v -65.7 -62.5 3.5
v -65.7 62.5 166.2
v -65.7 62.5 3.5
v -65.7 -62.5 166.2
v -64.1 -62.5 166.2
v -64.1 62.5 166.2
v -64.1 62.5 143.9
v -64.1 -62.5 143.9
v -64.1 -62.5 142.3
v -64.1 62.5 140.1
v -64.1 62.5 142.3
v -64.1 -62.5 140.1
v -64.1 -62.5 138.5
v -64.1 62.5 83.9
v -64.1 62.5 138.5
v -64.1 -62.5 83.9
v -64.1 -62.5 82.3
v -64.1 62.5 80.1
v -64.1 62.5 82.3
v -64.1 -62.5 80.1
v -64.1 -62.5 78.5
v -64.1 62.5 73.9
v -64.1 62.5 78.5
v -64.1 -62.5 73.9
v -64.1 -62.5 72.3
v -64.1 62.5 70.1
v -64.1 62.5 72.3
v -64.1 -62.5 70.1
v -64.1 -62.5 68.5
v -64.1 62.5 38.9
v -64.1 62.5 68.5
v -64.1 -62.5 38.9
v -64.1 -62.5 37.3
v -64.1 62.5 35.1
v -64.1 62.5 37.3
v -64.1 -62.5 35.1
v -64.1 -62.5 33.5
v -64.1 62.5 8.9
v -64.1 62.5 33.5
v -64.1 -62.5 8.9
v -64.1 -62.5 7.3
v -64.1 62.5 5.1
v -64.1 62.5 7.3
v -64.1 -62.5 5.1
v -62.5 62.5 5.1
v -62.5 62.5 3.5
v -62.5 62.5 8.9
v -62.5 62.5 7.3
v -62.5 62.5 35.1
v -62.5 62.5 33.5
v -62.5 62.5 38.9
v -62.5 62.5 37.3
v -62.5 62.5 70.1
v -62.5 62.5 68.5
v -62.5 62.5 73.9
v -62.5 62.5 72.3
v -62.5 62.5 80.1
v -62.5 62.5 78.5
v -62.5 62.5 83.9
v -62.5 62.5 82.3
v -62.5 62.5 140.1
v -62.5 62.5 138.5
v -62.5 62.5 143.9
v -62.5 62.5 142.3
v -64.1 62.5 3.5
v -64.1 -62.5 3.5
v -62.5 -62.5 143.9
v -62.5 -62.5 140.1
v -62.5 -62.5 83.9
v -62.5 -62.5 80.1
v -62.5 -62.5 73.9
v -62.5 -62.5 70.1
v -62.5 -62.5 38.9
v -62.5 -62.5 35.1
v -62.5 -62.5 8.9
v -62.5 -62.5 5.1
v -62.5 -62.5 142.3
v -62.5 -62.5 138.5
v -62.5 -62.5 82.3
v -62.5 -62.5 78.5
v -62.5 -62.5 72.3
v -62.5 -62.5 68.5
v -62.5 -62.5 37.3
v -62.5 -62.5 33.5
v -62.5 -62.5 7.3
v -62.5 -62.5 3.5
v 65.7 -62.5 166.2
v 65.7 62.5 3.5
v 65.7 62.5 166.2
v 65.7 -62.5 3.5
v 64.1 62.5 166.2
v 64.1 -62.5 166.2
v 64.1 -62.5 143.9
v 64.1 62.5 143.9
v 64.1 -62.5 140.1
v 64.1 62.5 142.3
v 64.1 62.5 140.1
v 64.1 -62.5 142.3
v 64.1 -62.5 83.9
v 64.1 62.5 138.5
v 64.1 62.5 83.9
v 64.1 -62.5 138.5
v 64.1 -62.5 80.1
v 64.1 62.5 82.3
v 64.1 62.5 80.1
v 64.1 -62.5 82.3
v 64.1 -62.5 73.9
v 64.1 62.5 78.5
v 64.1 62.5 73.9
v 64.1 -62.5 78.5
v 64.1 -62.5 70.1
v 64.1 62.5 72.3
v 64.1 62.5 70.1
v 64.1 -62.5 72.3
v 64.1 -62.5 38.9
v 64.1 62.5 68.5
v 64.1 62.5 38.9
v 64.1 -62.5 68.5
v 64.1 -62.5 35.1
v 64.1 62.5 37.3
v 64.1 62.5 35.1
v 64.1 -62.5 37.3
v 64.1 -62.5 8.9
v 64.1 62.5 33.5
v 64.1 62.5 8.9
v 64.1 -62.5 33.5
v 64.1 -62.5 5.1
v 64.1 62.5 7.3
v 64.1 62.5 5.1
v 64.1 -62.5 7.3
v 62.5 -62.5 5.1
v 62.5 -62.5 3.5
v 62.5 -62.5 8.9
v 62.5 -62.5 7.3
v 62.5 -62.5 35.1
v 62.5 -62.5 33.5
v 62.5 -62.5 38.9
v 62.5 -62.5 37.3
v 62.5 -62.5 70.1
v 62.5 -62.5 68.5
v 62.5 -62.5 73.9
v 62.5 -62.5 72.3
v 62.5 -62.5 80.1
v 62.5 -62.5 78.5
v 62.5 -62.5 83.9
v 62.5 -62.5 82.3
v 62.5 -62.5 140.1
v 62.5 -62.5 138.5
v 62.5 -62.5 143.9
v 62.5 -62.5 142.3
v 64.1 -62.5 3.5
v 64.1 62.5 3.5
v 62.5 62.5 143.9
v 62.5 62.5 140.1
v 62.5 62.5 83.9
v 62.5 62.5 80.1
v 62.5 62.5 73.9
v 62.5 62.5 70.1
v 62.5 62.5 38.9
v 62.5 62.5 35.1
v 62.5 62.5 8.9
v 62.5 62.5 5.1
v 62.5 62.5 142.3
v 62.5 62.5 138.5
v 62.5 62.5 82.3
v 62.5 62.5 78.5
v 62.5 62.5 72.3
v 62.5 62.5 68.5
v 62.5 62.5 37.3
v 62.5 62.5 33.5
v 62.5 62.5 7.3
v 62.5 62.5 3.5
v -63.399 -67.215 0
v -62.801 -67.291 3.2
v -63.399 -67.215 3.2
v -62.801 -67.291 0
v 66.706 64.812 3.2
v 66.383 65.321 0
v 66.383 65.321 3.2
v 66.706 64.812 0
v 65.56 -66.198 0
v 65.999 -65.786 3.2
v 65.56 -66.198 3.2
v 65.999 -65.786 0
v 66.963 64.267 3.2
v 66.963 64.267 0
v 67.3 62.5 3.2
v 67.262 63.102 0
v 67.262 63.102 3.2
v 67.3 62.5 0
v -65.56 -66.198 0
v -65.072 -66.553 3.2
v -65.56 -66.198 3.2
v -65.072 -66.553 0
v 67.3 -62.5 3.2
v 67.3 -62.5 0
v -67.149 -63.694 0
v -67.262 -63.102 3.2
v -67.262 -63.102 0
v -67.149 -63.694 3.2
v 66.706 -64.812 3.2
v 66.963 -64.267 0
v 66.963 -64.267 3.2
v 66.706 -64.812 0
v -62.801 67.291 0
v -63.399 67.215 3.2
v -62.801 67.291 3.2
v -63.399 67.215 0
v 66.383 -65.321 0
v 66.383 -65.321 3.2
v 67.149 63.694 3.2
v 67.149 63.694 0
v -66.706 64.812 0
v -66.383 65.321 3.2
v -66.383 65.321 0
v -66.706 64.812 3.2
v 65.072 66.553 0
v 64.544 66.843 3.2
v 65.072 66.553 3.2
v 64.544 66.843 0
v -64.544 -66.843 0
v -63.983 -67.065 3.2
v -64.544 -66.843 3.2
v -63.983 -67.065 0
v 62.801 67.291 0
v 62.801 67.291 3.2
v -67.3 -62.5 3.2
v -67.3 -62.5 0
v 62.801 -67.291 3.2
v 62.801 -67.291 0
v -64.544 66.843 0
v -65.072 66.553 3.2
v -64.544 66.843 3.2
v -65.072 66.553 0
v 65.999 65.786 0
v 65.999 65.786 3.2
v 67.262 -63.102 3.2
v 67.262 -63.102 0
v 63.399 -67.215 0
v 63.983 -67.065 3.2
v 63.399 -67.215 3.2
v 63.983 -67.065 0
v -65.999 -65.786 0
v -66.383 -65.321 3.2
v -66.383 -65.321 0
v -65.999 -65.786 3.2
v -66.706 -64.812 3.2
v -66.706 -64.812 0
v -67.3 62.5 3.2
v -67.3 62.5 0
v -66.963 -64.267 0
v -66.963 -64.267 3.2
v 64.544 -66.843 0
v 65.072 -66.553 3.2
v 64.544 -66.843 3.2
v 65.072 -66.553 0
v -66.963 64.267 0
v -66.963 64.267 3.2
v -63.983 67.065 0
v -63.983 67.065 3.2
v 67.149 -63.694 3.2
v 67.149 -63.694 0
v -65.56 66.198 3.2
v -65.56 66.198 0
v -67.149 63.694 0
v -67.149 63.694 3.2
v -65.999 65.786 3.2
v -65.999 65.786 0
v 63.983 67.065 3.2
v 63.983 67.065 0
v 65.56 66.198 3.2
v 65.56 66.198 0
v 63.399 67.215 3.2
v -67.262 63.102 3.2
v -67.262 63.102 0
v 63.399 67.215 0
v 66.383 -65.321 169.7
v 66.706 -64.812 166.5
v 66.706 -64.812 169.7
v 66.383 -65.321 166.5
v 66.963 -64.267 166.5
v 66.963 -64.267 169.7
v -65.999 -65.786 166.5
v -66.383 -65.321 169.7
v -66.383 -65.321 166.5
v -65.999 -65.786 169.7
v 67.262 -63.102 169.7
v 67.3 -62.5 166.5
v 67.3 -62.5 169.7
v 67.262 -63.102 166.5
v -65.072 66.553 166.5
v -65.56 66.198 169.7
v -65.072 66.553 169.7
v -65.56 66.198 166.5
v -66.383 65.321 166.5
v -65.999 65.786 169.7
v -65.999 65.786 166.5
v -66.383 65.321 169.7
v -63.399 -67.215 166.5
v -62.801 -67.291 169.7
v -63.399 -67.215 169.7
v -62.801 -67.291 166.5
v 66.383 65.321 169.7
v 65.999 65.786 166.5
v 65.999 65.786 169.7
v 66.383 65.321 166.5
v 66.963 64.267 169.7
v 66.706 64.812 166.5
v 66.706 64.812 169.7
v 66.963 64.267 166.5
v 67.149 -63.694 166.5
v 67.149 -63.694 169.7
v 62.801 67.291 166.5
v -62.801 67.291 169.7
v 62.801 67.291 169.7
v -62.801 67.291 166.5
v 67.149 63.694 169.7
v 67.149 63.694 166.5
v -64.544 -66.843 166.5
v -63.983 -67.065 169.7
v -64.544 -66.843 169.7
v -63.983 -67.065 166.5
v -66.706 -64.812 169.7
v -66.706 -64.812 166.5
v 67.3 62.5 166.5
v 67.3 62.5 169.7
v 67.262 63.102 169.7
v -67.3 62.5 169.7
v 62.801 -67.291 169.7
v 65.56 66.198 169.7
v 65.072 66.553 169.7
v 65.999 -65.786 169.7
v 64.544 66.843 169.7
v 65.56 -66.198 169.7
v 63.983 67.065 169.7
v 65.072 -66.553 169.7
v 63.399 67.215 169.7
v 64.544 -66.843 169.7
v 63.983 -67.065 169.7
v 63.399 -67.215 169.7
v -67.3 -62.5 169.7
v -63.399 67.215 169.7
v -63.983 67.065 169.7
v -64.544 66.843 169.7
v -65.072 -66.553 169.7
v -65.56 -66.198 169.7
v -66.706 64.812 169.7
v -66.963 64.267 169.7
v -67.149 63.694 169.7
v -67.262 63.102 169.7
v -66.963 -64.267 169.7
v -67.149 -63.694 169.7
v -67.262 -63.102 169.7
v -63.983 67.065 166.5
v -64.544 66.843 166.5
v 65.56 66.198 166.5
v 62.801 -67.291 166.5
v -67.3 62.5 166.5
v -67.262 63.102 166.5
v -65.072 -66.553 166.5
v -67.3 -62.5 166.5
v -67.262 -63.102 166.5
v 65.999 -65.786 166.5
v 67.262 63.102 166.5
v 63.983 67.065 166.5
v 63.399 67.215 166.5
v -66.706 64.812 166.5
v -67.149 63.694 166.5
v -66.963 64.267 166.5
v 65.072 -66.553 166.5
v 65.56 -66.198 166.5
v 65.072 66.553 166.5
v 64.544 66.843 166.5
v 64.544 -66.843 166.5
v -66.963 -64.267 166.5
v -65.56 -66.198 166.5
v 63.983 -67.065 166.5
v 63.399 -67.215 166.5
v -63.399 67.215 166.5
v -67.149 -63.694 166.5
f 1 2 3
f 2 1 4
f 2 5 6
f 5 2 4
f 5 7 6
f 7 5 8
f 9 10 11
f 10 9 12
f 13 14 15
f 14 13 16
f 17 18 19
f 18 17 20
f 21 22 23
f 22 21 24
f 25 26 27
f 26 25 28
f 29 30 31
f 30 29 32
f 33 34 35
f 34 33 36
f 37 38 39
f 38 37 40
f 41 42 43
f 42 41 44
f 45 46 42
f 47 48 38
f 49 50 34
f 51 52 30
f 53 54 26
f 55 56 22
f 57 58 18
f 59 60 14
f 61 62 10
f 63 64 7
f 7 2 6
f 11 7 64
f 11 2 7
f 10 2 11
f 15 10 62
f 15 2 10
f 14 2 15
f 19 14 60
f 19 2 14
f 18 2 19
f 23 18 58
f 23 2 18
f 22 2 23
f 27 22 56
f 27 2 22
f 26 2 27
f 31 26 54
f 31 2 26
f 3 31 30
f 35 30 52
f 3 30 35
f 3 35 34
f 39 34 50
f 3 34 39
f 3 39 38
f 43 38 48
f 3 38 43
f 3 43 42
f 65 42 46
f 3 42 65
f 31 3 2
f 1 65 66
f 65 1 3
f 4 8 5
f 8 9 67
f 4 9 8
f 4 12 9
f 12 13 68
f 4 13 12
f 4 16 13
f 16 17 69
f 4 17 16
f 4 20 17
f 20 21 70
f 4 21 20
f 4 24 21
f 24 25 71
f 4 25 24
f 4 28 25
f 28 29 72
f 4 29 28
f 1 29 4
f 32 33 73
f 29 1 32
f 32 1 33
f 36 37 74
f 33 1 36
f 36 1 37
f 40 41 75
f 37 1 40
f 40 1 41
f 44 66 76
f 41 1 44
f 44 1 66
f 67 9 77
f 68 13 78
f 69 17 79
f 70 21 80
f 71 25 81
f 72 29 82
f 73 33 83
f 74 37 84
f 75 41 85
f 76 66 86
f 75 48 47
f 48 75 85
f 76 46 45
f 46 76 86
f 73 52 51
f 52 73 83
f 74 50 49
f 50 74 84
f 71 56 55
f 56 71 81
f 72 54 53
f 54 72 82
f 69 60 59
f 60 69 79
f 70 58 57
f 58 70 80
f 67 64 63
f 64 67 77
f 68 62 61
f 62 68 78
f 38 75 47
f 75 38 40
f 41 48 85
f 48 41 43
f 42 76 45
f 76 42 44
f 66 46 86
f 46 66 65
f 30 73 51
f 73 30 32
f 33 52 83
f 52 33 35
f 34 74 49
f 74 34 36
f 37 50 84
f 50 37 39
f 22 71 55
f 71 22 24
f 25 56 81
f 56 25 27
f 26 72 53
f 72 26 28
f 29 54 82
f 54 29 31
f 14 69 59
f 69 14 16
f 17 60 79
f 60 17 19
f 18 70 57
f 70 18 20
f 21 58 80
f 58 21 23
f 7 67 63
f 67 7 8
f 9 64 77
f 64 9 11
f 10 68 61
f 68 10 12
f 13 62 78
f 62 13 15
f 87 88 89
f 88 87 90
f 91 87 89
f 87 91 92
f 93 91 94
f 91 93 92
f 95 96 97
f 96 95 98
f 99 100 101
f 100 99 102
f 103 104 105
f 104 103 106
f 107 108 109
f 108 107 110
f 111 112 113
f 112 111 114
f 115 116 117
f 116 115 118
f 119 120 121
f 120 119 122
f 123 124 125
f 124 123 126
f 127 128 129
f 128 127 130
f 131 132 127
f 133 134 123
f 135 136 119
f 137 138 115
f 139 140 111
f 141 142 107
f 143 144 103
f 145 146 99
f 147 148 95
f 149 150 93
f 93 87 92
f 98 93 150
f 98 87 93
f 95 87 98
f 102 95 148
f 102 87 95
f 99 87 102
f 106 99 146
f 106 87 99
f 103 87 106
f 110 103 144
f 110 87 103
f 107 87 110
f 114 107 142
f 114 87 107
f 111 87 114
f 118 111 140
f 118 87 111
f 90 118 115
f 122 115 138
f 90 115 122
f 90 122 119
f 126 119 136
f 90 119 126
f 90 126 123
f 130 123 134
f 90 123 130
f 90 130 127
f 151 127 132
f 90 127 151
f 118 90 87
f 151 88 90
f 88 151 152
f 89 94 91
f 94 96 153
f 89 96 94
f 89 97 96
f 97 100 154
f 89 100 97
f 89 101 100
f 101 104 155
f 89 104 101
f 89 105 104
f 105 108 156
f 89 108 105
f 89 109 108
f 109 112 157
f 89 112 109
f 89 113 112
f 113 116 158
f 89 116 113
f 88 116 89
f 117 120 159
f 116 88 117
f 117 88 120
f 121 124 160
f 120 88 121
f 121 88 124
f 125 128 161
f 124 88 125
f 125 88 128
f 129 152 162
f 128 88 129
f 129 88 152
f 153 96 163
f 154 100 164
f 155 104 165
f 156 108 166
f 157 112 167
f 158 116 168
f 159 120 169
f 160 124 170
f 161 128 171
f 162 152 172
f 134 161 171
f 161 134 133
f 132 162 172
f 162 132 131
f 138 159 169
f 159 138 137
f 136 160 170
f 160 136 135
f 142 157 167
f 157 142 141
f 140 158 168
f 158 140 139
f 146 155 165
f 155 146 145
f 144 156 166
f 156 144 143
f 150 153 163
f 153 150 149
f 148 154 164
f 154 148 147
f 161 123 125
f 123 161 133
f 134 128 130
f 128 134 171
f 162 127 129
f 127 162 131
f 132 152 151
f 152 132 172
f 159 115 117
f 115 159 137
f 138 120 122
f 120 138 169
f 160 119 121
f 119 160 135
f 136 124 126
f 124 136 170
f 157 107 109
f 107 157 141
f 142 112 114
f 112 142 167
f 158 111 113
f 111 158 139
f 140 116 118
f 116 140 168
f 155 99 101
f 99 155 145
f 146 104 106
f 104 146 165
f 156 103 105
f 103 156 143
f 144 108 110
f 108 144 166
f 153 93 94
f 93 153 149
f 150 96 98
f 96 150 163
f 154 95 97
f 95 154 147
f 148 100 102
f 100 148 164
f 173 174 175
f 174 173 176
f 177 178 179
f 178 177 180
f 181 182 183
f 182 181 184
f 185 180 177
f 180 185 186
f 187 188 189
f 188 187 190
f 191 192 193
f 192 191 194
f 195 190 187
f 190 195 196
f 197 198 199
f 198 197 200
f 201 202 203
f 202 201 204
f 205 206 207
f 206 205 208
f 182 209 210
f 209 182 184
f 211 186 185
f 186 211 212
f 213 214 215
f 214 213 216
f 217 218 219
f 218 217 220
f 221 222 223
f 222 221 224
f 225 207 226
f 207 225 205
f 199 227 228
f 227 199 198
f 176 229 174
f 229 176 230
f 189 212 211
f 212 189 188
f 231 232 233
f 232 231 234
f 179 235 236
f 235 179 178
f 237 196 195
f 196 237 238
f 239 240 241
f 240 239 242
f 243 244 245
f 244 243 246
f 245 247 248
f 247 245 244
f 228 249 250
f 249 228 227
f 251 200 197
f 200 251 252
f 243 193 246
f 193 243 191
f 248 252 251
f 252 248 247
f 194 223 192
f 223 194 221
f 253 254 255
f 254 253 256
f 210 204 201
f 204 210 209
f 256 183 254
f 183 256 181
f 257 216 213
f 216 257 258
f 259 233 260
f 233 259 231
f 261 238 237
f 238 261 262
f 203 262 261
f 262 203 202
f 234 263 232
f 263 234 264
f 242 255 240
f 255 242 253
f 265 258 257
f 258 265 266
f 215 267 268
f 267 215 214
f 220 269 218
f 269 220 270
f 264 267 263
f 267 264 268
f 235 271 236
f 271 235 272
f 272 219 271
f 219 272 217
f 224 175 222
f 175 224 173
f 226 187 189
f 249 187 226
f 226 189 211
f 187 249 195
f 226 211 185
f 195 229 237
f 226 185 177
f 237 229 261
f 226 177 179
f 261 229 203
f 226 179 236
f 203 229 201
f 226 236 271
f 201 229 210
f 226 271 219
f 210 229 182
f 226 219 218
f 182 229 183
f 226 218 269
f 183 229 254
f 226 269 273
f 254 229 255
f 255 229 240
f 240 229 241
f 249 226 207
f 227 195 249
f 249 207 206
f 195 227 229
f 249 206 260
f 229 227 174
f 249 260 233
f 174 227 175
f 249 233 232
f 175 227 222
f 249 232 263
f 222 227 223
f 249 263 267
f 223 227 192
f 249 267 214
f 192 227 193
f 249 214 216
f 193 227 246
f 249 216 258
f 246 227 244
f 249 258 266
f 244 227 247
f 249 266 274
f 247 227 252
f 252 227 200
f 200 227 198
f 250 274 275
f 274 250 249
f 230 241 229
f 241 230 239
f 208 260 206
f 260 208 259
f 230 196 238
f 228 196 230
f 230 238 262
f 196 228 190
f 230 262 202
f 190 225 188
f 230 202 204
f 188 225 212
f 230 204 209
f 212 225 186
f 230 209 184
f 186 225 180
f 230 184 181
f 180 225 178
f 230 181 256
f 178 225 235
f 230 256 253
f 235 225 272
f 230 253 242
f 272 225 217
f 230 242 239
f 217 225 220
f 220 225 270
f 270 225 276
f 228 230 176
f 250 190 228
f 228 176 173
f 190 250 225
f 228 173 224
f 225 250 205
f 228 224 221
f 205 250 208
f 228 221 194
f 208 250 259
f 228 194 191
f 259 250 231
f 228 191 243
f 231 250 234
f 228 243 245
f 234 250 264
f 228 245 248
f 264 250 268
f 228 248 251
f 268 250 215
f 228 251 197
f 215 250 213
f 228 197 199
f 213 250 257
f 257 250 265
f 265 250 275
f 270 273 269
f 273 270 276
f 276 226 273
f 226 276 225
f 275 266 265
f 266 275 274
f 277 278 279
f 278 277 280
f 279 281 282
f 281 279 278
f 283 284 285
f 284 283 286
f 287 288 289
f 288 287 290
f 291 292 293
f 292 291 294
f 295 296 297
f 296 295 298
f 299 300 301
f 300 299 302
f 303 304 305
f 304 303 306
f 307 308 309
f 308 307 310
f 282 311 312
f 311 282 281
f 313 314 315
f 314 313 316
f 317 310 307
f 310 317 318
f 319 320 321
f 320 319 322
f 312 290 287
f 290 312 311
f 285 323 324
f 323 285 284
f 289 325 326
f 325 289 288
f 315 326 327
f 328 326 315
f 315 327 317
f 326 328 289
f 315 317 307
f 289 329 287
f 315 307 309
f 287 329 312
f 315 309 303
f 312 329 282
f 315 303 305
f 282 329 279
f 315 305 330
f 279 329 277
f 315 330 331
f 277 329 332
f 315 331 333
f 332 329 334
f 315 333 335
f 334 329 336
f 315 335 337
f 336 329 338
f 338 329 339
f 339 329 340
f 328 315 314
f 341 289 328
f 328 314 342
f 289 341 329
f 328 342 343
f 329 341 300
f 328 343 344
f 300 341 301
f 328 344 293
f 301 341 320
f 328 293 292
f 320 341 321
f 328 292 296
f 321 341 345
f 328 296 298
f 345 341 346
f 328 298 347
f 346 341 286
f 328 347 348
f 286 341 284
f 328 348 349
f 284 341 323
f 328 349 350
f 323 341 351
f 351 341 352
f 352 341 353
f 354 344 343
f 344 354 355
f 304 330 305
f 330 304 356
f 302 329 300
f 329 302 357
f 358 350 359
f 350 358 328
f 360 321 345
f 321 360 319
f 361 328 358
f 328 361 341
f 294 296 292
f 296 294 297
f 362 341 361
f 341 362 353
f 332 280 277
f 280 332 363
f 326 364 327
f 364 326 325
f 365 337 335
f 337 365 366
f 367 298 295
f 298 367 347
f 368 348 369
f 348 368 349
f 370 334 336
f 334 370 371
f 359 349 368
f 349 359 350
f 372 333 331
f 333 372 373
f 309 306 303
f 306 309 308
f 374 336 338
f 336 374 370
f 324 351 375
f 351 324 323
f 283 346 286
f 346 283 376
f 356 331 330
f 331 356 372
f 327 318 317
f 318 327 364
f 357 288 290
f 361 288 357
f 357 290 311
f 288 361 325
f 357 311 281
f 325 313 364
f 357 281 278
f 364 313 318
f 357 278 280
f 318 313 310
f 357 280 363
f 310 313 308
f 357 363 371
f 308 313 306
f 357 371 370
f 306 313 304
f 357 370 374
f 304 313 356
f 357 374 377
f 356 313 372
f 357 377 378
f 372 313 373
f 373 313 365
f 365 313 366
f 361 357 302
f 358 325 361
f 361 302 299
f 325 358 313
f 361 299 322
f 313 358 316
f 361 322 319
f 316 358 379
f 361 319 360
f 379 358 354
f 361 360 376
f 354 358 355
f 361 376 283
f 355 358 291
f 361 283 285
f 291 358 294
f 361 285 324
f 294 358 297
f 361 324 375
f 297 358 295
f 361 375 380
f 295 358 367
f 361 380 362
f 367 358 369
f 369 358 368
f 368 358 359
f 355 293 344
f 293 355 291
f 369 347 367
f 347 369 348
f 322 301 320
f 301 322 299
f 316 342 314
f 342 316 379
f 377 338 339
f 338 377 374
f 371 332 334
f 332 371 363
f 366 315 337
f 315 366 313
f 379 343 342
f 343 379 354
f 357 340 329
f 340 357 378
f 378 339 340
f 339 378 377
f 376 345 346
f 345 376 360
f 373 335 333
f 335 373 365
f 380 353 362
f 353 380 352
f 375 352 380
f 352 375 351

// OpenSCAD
/*[Dimensions]*/
$fn = 50;
inner_x = 125;
inner_y = 125;
base_thickness = 3.2;
wall_thickness = 1.6;
wall_overflow = 1.6;
level_thickness = 1.6;
level_heights = [2.7, 30, 35, 10, 60, 25];
level_wing = 1.6;
level_wing_thickness = 1.6;
level_wing_overflow = 1.6;
tolerence = 0.3;
assert(level_heights[0] >= level_wing_thickness + level_thickness / 2 + tolerence);

function sum(v, num=-1, i=0, r=0) = (i<min(num, len(v))  || (i<len(v) && num==-1)) ? sum(v, num, i+1, r+v[i]) : r;

module base()
{
    linear_extrude(base_thickness)
    minkowski()
    {
        square([inner_x, inner_y], true);
        circle(level_wing + wall_thickness + wall_overflow);
    }
}

module level()
{
    linear_extrude(level_thickness)
    difference()
    {
        minkowski()
        {
            square([inner_x, inner_y], true);
            circle(level_wing + level_wing_overflow);
        }
        square([inner_x, inner_y], true);
    }
}

module side_wall()
{
    translate([-wall_thickness / 2, 0, 0])
    rotate(90, [0, 1, 0])
    union()
    {
        linear_extrude(wall_thickness)
        square([sum(level_heights), inner_y], true);
        linear_extrude(wall_thickness + level_wing)
        for(i = [1:len(level_heights) - 1])
        for(j = [-1:2:1])
        translate([sum(level_heights) / 2 - sum(level_heights, i) + j * ((level_thickness + level_wing_thickness) / 2 + tolerence), 0])
        square([level_wing_thickness, inner_y], true);
    }
}

base();

for(i = [0:180:180])
rotate(i, [0, 0, 1])
translate([-inner_x / 2 - level_wing - wall_thickness / 2, 0, sum(level_heights) / 2 + base_thickness + tolerence])
side_wall();

translate([0, 0, sum(level_heights) + 2 * base_thickness + 2 * tolerence])
rotate(180, [1, 0, 0])
base();
